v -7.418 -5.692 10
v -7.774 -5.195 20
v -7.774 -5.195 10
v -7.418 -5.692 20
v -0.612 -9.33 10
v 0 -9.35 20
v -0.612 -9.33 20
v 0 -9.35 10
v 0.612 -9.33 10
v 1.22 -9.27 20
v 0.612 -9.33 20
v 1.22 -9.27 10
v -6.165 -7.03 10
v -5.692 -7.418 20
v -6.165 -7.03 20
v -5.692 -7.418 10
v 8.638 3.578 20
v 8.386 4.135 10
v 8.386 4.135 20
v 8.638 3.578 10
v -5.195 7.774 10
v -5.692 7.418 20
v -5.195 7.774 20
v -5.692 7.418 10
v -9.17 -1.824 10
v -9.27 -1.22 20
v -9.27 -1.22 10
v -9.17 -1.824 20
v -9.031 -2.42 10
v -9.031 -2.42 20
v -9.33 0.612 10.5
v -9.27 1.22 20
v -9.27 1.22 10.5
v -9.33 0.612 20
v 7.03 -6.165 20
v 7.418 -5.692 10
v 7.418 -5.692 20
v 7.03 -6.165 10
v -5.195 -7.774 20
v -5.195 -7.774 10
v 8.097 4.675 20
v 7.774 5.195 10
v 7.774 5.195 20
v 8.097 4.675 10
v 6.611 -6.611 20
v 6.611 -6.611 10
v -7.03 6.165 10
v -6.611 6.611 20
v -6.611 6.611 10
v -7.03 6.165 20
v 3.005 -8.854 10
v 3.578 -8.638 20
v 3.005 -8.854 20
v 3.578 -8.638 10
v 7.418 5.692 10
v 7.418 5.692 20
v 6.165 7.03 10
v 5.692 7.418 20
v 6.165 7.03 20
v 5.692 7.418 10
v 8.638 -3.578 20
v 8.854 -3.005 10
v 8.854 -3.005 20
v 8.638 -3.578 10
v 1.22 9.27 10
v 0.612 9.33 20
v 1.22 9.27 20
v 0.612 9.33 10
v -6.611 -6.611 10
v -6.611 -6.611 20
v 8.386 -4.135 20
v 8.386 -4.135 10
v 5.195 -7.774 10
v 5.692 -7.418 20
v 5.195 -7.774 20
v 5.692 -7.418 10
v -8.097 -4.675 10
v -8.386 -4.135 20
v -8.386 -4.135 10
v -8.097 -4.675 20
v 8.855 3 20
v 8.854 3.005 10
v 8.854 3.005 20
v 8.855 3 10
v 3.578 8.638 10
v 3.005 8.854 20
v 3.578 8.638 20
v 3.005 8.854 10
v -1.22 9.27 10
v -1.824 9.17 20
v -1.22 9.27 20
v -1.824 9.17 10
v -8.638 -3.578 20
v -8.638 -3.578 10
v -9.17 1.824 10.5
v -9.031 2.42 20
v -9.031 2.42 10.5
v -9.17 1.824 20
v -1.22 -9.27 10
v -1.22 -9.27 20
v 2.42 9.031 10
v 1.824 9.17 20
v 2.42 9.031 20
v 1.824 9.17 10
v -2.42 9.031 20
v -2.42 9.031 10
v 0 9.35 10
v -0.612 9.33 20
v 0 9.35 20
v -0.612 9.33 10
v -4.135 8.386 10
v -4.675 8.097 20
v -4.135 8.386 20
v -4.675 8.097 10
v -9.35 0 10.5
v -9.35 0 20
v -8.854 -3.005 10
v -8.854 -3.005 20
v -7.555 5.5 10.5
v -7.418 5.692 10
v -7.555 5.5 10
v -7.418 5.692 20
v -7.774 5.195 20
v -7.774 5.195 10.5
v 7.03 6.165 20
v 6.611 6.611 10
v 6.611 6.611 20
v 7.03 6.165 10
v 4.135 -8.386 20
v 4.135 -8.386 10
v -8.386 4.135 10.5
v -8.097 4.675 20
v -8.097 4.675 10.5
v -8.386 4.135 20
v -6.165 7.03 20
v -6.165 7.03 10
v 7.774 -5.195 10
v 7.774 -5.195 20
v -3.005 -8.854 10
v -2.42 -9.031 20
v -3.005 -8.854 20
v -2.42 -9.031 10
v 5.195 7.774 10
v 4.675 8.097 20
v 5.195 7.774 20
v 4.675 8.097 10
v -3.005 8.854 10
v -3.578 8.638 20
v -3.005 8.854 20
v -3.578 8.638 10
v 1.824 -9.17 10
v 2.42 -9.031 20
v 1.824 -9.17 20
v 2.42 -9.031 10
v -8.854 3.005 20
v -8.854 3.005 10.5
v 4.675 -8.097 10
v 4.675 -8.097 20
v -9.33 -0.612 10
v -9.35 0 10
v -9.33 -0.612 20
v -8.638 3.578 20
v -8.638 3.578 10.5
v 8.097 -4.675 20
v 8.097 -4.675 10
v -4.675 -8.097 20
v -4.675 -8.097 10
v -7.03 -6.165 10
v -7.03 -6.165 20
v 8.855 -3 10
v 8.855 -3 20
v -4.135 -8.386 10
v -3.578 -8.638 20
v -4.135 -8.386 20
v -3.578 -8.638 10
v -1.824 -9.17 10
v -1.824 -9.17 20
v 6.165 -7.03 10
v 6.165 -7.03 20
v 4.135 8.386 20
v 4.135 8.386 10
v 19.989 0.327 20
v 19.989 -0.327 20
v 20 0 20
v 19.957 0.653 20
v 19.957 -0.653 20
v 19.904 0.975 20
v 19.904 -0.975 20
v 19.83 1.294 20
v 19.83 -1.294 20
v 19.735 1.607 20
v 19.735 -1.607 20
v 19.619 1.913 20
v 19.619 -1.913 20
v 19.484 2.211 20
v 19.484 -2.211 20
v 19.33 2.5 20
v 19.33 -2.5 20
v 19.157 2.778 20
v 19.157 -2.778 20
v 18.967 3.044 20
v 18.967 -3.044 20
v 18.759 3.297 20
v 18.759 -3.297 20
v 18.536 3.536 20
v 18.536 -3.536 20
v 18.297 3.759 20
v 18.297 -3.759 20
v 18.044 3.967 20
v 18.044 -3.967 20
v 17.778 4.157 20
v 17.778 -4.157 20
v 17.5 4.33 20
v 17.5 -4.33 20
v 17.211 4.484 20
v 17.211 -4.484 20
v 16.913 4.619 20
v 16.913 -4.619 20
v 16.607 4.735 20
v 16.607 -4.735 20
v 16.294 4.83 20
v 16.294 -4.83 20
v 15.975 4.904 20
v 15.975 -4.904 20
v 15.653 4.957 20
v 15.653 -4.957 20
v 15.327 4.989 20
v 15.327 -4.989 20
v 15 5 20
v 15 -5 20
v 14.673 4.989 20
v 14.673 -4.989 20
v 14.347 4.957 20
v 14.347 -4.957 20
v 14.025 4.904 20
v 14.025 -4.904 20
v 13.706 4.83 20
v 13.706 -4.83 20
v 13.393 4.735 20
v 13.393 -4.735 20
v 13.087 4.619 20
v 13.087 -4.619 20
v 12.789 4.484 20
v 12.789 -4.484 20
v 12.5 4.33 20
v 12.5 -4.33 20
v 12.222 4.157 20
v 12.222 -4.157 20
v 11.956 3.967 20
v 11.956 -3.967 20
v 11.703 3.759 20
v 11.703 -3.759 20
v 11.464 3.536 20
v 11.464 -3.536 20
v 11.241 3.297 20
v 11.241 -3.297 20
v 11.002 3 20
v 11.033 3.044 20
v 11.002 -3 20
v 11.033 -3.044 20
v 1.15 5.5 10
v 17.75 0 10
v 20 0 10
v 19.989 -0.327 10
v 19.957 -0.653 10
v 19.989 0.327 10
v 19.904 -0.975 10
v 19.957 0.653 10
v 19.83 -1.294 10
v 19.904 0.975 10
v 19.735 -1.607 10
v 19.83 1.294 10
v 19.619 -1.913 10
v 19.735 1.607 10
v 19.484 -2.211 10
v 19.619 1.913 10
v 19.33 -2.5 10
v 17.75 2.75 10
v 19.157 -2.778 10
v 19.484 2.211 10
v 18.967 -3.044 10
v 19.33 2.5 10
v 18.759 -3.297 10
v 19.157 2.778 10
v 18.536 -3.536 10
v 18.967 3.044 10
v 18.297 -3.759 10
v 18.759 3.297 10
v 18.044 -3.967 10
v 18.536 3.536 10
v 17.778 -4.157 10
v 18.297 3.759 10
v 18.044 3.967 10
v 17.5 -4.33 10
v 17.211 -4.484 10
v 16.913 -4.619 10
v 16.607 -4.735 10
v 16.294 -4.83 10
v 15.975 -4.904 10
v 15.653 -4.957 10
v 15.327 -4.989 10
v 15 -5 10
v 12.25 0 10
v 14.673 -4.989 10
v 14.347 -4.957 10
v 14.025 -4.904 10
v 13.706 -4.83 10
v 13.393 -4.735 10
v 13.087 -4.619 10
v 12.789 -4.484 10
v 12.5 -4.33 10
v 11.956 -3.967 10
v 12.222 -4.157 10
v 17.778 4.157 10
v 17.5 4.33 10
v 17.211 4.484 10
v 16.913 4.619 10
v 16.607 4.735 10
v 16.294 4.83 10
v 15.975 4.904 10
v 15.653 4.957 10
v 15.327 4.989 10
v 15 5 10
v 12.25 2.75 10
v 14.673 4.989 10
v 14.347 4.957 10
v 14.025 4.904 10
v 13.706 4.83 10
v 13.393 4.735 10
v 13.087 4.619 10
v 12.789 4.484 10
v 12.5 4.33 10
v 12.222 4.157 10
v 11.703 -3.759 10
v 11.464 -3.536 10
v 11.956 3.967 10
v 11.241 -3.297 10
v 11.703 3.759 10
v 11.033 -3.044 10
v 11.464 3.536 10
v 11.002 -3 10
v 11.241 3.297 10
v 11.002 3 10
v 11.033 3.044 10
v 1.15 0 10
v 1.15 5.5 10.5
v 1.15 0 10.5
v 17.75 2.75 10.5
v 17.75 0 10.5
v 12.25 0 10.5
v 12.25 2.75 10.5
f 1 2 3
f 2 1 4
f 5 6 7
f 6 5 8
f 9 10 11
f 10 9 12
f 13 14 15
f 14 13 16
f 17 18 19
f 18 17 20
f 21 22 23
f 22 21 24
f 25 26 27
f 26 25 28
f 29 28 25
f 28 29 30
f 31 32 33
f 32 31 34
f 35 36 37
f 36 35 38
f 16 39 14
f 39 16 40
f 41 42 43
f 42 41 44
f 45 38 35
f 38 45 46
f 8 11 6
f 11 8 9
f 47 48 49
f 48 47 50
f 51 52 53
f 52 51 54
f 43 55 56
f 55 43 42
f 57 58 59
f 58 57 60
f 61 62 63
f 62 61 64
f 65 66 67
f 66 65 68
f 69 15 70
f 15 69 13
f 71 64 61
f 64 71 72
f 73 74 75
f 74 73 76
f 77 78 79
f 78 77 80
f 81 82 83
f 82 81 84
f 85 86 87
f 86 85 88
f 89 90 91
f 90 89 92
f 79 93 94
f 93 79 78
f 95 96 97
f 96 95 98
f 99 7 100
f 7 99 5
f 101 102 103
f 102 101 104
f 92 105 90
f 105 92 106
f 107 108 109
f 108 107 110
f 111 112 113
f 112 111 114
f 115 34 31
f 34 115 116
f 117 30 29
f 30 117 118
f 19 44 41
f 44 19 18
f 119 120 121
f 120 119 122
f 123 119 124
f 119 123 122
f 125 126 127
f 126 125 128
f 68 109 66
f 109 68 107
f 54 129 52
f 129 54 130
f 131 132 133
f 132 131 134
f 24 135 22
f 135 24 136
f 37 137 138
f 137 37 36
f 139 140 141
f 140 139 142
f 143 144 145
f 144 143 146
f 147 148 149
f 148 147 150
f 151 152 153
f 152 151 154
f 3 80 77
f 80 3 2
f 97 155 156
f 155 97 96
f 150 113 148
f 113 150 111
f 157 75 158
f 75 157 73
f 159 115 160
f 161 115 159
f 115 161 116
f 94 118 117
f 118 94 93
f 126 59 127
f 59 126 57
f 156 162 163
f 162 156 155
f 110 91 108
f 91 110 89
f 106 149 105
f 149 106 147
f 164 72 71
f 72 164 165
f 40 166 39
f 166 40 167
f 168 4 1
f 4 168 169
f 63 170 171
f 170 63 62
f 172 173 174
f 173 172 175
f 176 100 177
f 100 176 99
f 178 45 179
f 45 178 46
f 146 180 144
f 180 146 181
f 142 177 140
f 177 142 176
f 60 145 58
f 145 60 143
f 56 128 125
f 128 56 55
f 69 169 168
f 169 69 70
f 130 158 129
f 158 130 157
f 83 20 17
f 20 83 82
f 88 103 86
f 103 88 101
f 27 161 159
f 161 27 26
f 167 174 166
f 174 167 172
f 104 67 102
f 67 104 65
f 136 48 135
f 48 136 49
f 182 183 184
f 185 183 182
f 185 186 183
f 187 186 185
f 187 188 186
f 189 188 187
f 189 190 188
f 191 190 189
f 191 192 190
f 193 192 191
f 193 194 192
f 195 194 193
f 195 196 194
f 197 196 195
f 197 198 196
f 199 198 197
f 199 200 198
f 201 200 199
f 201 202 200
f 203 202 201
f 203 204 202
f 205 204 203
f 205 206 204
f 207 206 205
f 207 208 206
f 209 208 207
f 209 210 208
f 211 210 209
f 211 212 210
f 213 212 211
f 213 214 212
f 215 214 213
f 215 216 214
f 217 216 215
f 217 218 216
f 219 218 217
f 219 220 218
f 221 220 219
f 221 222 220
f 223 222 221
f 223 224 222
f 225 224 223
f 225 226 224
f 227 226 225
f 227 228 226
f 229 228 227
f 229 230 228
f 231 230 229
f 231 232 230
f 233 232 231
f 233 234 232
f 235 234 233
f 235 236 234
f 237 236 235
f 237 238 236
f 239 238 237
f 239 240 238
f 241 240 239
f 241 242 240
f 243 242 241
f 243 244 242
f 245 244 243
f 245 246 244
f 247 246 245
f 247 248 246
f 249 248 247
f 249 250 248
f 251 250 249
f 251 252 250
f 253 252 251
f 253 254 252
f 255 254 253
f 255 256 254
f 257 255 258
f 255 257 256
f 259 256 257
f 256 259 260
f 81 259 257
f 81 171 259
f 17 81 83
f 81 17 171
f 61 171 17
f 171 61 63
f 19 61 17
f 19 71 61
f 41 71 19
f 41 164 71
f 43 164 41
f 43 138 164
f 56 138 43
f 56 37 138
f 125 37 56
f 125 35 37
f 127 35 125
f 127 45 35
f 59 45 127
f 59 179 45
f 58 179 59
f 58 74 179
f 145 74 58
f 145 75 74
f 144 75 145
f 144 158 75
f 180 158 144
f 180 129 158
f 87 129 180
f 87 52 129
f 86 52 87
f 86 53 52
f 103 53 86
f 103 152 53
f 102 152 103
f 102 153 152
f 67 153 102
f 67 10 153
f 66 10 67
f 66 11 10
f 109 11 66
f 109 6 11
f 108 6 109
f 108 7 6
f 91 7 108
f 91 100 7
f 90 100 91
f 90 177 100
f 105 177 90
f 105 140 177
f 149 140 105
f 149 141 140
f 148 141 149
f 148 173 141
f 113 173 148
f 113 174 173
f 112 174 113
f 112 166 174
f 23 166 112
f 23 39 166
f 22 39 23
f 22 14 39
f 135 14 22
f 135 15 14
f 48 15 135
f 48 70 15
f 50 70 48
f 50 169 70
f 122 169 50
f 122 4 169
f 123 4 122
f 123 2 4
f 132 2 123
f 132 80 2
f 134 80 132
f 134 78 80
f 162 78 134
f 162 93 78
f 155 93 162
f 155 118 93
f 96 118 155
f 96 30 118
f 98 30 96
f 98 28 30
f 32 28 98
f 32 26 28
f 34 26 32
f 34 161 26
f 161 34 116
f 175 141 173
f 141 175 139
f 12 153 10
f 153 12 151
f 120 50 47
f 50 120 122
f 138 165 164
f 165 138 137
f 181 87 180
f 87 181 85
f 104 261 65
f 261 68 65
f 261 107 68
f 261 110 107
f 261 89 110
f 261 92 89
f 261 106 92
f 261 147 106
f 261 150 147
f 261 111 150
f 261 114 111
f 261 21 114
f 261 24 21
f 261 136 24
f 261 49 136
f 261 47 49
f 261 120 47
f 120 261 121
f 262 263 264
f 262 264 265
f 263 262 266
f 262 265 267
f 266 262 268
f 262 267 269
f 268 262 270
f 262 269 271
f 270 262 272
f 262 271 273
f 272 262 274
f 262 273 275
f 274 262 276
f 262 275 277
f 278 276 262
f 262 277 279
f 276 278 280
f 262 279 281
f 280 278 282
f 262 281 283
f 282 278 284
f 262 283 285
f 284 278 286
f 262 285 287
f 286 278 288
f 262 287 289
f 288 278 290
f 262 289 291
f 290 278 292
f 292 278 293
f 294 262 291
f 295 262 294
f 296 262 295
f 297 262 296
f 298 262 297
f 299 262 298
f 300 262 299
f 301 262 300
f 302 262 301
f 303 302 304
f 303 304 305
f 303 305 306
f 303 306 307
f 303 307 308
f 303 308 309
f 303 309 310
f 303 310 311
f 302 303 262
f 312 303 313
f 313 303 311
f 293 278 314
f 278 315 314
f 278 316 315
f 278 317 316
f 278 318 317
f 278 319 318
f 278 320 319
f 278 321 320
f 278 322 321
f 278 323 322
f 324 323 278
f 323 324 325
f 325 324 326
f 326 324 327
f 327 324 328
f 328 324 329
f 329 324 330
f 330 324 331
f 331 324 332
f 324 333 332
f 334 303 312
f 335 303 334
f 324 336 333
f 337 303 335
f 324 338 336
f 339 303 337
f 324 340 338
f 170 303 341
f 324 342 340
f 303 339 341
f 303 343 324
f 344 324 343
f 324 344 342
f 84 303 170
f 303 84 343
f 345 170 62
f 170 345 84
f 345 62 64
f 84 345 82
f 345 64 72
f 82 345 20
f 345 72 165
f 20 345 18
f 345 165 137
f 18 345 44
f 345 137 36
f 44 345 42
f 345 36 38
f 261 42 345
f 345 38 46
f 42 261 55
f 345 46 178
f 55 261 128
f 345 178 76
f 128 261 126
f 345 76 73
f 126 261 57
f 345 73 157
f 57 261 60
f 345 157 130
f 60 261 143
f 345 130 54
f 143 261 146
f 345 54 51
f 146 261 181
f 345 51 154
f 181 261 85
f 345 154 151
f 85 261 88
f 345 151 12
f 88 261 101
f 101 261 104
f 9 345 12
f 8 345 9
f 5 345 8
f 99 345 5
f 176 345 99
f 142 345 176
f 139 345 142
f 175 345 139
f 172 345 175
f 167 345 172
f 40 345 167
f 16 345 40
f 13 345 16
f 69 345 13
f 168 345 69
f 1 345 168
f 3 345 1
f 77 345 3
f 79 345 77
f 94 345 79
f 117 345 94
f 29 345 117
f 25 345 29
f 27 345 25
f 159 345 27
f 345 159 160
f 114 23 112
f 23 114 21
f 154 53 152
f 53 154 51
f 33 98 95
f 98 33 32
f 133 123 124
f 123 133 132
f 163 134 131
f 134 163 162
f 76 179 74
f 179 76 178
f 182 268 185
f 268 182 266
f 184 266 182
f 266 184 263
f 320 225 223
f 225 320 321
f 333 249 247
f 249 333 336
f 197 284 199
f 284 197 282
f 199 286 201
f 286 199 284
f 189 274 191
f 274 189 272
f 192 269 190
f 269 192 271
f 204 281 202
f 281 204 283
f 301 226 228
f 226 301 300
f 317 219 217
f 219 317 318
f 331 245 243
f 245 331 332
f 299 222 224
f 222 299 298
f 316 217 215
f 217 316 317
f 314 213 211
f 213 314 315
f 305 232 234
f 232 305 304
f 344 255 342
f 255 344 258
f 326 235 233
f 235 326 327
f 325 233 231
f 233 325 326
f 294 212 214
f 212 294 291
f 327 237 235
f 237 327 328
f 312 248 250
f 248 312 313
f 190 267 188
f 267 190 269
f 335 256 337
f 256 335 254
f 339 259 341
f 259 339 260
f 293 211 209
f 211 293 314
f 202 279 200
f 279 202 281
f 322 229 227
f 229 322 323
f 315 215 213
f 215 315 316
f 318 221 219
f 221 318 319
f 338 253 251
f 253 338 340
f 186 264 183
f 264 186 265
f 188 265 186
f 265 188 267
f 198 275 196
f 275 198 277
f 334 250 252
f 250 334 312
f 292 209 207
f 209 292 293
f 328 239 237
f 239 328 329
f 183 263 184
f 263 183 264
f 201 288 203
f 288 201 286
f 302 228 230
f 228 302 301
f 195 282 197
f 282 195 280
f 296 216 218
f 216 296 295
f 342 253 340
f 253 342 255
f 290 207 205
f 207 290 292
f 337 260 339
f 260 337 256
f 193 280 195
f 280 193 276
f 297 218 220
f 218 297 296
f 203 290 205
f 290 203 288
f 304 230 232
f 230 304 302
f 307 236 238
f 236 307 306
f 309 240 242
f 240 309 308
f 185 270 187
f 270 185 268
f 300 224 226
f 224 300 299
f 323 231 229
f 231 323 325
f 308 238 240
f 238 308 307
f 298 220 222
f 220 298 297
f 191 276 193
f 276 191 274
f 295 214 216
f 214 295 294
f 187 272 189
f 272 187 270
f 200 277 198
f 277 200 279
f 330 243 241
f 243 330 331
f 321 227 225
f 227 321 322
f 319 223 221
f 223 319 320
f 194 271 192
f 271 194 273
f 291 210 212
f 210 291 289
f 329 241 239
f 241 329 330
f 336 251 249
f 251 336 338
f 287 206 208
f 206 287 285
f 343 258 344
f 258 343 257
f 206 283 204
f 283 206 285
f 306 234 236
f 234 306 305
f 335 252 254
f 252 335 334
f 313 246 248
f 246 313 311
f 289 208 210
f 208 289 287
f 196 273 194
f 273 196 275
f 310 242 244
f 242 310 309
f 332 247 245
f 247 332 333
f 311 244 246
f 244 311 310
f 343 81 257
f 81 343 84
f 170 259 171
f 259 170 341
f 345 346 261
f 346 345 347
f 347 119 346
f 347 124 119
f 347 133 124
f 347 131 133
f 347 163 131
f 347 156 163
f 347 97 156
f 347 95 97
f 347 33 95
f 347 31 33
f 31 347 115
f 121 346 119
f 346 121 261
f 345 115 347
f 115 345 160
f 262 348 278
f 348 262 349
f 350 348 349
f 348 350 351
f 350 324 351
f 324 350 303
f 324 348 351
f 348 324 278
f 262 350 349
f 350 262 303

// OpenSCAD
// Snap-on tubing clip for a 12.7 mm lab stand rod
// Print orientation: flat on bed (XY), extrusion in +Z

// ---- Stand rod ring ----
stand_id   = 12.7;   // rod diameter
stand_wall = 3;      // wall thickness
stand_od   = stand_id + 2 * stand_wall;  // 18.7 mm outer diameter
stand_open = 10;     // opening width on -X side

// ---- Tubing ring ----
tube_id    = 6;      // tubing inner diameter
tube_wall  = 2;      // wall thickness
tube_od    = tube_id + 2 * tube_wall;    // 10 mm outer diameter
tube_x     = 15;     // ring centre X
tube_open  = 4.5;    // opening width on +X side

// ---- Bridge ----
bridge_x1  = 8;      // start X
bridge_x2  = 12;     // end X
bridge_w   = 6;      // width in Y

// ---- Misc ----
eps        = 0.5;    // cutter overshoot
height     = 10;     // extrusion height
$fn        = 96;     // circle resolution

difference() {
    union() {
        // Stand rod ring
        translate([0, 0, height])
            cylinder(d = stand_od, h = height);
        // Tubing ring
        translate([tube_x, 0, height])
            cylinder(d = tube_od, h = height);
        // Bridge
        translate([bridge_x1, -bridge_w / 2, height])
            cube([bridge_x2 - bridge_x1, bridge_w, height]);
    }
    // Stand ring opening (y > 0, extended below z = 0)
    translate([-stand_od / 2 - eps, 0, -eps])
        cube([stand_open + 2 * eps, stand_open / 2 + eps, height + 2 * eps]);
    // Tubing ring opening (y < 0, extended below z = 0)
    translate([tube_x - tube_open / 2 - eps, 0, -eps])
        cube([tube_open + 2 * eps, tube_open / 2 + eps, height + 2 * eps]);
}
